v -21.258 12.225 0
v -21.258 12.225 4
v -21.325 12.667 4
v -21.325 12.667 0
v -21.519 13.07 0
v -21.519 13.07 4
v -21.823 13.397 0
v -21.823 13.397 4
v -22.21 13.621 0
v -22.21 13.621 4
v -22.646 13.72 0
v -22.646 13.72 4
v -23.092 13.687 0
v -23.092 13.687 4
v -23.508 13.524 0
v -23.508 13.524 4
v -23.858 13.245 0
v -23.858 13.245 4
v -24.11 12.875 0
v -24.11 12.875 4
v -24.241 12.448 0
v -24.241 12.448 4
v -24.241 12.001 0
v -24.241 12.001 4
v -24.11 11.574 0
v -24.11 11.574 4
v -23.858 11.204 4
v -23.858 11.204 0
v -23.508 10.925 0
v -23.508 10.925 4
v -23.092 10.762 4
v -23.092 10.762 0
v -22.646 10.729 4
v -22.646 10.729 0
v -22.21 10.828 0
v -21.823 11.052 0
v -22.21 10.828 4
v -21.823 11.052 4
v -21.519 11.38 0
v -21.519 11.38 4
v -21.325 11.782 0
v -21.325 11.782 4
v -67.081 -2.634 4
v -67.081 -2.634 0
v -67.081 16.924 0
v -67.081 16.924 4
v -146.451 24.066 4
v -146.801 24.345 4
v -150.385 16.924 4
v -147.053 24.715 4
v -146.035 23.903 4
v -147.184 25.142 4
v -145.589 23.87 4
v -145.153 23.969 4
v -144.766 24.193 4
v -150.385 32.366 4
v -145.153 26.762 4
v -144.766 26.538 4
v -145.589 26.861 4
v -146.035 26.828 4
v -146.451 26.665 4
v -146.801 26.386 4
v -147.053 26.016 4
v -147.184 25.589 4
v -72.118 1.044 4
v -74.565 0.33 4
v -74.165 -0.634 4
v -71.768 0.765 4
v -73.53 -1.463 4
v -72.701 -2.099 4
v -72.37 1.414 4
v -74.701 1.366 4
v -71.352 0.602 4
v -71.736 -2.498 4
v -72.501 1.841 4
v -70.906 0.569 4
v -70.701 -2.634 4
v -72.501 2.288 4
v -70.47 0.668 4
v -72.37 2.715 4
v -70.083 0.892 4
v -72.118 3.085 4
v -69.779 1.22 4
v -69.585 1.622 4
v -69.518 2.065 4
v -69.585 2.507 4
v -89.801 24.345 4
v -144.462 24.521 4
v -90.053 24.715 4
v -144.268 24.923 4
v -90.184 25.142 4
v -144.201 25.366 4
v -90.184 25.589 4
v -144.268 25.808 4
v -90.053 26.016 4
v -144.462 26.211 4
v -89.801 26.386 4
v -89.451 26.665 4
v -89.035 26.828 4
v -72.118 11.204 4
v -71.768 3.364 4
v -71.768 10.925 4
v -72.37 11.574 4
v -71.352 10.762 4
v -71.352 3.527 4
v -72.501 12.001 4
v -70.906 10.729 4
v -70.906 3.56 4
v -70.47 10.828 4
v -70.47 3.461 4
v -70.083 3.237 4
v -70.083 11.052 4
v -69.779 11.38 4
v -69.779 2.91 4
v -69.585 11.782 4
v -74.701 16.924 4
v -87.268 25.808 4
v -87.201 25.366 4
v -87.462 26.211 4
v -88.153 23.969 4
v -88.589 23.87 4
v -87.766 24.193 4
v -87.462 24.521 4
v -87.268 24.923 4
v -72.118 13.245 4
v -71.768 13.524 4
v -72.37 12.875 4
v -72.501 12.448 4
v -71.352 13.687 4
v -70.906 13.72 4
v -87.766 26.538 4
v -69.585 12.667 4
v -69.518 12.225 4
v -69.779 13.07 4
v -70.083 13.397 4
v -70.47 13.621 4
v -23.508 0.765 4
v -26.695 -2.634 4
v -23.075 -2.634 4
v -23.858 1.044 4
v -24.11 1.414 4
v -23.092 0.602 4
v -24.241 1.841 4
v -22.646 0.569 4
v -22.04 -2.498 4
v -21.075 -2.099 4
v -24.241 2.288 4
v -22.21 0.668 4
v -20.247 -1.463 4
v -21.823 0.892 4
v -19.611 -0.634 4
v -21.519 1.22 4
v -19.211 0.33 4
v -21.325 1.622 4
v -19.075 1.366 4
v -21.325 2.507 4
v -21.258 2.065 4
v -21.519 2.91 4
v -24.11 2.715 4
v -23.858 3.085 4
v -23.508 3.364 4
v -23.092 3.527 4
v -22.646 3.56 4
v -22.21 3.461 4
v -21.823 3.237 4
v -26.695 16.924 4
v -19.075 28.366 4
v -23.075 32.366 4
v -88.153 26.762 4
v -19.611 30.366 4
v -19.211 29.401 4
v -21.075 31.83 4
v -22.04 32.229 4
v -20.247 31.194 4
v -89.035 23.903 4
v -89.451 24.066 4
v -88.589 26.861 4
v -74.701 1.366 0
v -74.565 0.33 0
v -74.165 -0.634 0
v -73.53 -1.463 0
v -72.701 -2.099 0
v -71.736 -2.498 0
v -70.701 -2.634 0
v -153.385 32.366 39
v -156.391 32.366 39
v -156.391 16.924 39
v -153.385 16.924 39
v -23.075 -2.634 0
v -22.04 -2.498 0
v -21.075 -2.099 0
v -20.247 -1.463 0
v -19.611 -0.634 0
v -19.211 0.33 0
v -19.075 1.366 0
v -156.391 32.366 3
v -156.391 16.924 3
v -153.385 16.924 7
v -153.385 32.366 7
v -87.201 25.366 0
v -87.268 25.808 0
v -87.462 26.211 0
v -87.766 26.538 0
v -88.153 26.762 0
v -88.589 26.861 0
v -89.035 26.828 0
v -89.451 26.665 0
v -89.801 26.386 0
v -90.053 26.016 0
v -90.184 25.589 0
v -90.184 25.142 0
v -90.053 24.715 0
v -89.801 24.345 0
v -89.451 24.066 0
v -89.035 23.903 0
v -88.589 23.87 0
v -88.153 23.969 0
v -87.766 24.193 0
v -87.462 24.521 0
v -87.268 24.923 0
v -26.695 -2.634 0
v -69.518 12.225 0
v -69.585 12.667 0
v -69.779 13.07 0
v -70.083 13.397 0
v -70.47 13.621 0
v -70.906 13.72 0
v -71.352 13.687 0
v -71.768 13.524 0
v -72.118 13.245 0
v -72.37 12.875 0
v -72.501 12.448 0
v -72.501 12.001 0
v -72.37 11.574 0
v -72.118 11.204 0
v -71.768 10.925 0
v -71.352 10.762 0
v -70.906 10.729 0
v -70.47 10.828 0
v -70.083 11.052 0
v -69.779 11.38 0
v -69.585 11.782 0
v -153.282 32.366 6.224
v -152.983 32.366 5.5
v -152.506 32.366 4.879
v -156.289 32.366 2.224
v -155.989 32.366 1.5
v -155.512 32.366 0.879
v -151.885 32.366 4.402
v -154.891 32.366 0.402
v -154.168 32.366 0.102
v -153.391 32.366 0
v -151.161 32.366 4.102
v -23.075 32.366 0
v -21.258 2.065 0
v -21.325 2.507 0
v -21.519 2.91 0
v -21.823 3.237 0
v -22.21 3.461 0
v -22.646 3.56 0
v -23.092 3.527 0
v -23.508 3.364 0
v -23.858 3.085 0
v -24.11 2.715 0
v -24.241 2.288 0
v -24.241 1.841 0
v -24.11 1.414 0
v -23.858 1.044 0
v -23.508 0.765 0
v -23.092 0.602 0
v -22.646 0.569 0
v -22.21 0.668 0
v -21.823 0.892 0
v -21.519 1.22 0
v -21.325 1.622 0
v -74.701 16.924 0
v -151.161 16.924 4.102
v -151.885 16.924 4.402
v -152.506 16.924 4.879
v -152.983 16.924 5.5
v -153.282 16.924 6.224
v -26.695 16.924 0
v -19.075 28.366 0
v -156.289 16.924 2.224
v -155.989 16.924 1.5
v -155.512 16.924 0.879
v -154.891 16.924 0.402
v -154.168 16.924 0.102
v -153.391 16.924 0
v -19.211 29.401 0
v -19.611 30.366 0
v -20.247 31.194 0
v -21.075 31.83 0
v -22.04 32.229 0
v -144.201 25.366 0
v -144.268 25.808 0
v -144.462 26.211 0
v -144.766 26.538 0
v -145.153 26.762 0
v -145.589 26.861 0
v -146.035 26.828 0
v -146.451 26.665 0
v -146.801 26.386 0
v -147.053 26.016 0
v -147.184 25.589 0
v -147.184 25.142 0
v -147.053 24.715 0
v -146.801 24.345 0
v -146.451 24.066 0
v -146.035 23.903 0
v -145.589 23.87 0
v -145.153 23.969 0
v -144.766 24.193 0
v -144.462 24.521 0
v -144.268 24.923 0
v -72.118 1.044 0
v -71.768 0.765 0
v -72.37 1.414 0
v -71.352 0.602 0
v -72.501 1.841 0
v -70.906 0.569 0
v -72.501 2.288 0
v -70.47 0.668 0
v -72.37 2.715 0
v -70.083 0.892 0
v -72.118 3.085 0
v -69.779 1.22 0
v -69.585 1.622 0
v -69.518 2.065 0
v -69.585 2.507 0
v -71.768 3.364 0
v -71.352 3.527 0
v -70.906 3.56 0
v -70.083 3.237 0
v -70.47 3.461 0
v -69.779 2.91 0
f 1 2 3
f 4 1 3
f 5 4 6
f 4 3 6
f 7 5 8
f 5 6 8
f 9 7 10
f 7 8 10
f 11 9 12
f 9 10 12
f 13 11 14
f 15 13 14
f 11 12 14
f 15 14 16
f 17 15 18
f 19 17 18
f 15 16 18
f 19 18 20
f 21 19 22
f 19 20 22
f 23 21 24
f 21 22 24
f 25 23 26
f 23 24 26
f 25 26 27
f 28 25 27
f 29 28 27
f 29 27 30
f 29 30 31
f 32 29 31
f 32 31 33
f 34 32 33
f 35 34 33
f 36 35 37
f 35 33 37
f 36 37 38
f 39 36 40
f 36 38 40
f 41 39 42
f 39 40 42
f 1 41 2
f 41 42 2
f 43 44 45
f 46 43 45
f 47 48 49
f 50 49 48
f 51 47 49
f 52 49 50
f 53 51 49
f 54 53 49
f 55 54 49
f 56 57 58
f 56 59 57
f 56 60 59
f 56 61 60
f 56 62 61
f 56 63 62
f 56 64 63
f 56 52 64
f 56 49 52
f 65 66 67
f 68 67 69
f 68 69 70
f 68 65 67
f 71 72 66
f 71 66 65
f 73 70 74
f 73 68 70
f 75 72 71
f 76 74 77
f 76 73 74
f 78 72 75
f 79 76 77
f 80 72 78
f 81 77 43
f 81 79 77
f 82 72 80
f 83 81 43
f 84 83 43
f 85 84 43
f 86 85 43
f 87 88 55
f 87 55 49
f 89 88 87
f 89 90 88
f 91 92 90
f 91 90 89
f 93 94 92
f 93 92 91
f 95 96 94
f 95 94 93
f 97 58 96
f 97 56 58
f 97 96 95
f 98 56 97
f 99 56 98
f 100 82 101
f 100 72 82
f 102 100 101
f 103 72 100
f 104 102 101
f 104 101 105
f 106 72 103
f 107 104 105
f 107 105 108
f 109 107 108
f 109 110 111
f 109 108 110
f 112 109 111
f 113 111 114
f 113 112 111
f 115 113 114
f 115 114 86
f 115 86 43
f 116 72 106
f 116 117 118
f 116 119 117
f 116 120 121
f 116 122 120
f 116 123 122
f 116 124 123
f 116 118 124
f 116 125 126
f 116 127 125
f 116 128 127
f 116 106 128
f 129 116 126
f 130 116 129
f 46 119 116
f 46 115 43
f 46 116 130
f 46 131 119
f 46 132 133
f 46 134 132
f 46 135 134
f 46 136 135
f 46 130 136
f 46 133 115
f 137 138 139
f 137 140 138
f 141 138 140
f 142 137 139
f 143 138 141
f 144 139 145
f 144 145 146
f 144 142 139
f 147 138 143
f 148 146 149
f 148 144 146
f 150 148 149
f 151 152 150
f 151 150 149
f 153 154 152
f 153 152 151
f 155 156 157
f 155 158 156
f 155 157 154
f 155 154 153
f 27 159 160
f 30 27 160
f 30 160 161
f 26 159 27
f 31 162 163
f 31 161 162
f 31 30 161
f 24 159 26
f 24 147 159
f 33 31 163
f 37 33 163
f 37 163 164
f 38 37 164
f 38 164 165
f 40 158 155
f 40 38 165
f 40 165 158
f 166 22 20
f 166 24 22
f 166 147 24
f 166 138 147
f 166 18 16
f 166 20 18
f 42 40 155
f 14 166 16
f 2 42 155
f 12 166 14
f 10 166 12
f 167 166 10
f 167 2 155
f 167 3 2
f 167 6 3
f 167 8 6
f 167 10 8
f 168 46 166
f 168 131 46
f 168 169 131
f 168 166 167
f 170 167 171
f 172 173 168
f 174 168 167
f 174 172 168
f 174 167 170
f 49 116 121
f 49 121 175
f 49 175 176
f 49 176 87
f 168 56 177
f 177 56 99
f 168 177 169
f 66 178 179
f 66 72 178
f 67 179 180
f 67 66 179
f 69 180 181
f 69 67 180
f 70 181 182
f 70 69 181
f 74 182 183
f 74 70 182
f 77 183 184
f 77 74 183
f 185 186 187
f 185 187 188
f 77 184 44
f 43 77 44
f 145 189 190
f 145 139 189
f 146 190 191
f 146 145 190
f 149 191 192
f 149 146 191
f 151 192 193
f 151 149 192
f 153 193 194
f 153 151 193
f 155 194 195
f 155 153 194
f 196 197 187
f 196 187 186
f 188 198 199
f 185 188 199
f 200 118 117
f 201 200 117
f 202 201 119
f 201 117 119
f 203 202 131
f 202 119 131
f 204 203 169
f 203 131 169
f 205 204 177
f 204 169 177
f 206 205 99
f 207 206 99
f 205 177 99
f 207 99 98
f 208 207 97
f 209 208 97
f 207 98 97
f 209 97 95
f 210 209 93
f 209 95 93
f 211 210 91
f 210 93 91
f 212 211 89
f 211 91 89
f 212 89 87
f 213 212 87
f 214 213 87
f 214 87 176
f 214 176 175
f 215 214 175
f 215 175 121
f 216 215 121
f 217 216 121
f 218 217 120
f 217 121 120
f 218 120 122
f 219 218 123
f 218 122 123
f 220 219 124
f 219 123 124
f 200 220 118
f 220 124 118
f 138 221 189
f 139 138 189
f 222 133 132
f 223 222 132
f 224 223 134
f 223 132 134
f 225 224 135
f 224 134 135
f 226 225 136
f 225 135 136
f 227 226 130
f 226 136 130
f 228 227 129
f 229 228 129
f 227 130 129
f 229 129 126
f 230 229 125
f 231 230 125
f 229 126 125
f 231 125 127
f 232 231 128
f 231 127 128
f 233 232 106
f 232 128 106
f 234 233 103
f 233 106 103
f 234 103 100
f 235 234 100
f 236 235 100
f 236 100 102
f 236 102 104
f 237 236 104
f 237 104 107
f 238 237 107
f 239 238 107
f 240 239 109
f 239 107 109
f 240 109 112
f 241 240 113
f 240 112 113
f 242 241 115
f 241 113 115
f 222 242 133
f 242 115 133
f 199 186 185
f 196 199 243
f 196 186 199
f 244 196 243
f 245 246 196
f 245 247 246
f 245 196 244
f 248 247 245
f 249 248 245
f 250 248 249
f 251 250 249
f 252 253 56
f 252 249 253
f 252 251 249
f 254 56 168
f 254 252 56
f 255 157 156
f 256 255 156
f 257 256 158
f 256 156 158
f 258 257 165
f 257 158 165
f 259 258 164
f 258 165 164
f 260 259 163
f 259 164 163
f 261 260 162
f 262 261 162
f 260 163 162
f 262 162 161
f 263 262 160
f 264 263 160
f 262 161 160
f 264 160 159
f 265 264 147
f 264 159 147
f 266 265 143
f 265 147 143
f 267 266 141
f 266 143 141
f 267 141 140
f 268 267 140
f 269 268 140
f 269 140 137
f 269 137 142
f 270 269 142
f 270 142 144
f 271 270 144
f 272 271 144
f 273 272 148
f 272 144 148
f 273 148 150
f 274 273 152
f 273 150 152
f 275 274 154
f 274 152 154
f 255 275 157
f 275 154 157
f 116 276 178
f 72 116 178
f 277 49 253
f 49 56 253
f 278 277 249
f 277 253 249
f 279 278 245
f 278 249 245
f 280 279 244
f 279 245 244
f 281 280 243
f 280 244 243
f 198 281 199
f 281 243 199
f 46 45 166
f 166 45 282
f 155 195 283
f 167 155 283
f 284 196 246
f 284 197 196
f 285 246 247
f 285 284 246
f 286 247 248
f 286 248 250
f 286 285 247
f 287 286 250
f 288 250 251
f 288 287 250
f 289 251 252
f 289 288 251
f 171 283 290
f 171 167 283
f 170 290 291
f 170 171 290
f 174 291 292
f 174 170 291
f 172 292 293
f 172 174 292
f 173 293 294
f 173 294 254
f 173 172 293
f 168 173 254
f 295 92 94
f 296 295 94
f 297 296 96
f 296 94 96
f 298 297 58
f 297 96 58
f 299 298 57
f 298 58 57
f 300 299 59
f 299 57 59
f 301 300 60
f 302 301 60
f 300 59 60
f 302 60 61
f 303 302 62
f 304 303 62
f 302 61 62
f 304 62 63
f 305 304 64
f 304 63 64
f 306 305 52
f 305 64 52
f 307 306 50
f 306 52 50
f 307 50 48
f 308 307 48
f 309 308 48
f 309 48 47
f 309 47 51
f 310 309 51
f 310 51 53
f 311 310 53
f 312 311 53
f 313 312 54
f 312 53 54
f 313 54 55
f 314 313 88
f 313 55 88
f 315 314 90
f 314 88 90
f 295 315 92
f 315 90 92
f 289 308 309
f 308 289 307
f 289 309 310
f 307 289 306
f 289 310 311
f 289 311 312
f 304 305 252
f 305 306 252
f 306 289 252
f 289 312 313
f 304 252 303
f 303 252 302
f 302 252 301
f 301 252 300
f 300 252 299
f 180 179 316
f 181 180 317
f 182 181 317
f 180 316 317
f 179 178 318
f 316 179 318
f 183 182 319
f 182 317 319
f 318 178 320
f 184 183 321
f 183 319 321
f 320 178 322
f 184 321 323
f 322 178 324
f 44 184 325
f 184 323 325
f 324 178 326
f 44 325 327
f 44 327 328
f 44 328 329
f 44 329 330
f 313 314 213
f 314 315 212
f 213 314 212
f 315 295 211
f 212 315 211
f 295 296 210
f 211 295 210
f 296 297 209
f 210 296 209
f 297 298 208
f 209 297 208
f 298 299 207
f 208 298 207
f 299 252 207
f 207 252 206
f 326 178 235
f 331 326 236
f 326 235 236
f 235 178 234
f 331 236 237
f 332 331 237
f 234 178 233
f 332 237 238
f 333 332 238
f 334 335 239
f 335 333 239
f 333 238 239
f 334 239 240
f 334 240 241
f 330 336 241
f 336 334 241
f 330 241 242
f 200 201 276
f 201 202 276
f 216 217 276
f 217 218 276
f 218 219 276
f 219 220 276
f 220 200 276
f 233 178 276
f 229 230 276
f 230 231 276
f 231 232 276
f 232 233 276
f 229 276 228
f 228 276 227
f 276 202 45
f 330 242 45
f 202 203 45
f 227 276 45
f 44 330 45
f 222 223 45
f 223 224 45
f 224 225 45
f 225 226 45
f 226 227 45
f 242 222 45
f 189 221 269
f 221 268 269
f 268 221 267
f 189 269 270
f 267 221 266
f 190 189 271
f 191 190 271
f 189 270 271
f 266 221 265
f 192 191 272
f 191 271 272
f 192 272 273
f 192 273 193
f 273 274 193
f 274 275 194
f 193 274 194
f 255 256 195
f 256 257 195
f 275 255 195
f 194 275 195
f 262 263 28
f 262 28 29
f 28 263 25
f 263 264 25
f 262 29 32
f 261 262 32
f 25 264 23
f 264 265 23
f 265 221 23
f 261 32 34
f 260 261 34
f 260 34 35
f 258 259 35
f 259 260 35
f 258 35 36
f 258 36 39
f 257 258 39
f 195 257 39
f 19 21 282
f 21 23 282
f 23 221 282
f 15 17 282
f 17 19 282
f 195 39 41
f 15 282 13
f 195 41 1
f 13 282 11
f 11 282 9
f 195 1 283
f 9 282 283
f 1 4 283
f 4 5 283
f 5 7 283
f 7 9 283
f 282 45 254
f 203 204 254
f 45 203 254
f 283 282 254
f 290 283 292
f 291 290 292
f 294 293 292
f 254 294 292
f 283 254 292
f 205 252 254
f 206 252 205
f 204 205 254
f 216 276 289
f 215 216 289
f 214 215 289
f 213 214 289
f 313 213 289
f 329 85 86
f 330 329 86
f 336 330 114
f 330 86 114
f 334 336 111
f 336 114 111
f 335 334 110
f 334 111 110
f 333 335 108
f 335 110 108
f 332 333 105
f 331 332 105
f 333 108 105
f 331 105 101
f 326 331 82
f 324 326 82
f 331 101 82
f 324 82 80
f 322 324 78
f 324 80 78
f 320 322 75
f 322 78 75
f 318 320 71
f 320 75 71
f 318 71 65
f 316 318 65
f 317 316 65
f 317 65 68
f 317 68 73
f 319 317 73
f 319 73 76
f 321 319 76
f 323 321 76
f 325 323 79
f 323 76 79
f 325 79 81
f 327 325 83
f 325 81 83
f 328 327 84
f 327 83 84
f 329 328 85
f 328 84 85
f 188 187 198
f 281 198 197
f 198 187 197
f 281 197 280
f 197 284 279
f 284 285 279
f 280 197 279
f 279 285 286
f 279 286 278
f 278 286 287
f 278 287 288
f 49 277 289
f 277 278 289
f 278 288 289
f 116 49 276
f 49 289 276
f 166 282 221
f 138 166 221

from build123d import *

# Parameters (mm, degrees)
BOSS_EXTRUDE2_DEPTH = 4
FILLET1_R           = 4
SKETCH6_R           = 1.5
CUT_EXTRUDE1_DEPTH  = 4
SKETCH3_R           = 1.5
CUT_EXTRUDE2_DEPTH  = 4
SKETCH7_W           = 3.00651588
SKETCH7_H           = 15.442
BOSS_EXTRUDE3_DEPTH = 35
FILLET2_R           = 3
FILLET3_R           = 3


with BuildPart() as part:
    # Sketch2 → Boss-Extrude2 (new body)
    with BuildSketch(Plane.XY):
        Polygon((-67.081093968, -2.634474623), (-67.081093968, 16.923525377), (-26.695093968, 16.923525377), (-26.695093968, -2.634474623), (-19.075093968, -2.634474623), (-19.075093968, 32.365525377), (-67.081093968, 32.365525377), (-74.701093968, 32.365525377), (-156.39106061, 32.365525377), (-156.39106061, 16.923525377), (-74.701093968, 16.923525377), (-74.701093968, -2.634474623), align=None)
    extrude(amount=BOSS_EXTRUDE2_DEPTH)

    # Fillet1
    fillet1_edges = [part.edges().sort_by_distance(p)[0] for p in [
        (-19.075093968, 32.365525377, 2),
        (-19.075093968, -2.634474623, 2),
        (-74.701093968, -2.634474623, 2),
    ]]
    fillet(fillet1_edges, radius=FILLET1_R)

    # Sketch6 → Cut-Extrude1 (cut)
    with BuildSketch(Plane.XY.offset(4)):
        with Locations((-71.018093968, 12.224525377)):
            Circle(SKETCH6_R)
        with Locations((-22.758093968, 12.224525377)):
            Circle(SKETCH6_R)
        with Locations((-22.758093968, 2.064525377)):
            Circle(SKETCH6_R)
        with Locations((-71.018093968, 2.064525377)):
            Circle(SKETCH6_R)
    extrude(amount=-CUT_EXTRUDE1_DEPTH, mode=Mode.SUBTRACT)

    # Sketch3 → Cut-Extrude2 (cut)
    with BuildSketch(Plane.XY.offset(4)):
        with Locations((-145.701093968, 25.365525377)):
            Circle(SKETCH3_R)
        with Locations((-88.701093968, 25.365525377)):
            Circle(SKETCH3_R)
    extrude(amount=-CUT_EXTRUDE2_DEPTH, mode=Mode.SUBTRACT)

    # Sketch7 → Boss-Extrude3 (add)
    with BuildSketch(Plane.XY.offset(4)):
        with Locations((-154.88780267, 24.644525377)):
            Rectangle(SKETCH7_W, SKETCH7_H)
    extrude(amount=BOSS_EXTRUDE3_DEPTH)

    # Fillet2
    fillet2_edges = [part.edges().sort_by_distance(p)[0] for p in [
        (-153.38454473, 24.644525377, 4),
    ]]
    fillet(fillet2_edges, radius=FILLET2_R)

    # Fillet3
    fillet3_edges = [part.edges().sort_by_distance(p)[0] for p in [
        (-156.39106061, 24.644525377, 0),
    ]]
    fillet(fillet3_edges, radius=FILLET3_R)


solid = part.part
